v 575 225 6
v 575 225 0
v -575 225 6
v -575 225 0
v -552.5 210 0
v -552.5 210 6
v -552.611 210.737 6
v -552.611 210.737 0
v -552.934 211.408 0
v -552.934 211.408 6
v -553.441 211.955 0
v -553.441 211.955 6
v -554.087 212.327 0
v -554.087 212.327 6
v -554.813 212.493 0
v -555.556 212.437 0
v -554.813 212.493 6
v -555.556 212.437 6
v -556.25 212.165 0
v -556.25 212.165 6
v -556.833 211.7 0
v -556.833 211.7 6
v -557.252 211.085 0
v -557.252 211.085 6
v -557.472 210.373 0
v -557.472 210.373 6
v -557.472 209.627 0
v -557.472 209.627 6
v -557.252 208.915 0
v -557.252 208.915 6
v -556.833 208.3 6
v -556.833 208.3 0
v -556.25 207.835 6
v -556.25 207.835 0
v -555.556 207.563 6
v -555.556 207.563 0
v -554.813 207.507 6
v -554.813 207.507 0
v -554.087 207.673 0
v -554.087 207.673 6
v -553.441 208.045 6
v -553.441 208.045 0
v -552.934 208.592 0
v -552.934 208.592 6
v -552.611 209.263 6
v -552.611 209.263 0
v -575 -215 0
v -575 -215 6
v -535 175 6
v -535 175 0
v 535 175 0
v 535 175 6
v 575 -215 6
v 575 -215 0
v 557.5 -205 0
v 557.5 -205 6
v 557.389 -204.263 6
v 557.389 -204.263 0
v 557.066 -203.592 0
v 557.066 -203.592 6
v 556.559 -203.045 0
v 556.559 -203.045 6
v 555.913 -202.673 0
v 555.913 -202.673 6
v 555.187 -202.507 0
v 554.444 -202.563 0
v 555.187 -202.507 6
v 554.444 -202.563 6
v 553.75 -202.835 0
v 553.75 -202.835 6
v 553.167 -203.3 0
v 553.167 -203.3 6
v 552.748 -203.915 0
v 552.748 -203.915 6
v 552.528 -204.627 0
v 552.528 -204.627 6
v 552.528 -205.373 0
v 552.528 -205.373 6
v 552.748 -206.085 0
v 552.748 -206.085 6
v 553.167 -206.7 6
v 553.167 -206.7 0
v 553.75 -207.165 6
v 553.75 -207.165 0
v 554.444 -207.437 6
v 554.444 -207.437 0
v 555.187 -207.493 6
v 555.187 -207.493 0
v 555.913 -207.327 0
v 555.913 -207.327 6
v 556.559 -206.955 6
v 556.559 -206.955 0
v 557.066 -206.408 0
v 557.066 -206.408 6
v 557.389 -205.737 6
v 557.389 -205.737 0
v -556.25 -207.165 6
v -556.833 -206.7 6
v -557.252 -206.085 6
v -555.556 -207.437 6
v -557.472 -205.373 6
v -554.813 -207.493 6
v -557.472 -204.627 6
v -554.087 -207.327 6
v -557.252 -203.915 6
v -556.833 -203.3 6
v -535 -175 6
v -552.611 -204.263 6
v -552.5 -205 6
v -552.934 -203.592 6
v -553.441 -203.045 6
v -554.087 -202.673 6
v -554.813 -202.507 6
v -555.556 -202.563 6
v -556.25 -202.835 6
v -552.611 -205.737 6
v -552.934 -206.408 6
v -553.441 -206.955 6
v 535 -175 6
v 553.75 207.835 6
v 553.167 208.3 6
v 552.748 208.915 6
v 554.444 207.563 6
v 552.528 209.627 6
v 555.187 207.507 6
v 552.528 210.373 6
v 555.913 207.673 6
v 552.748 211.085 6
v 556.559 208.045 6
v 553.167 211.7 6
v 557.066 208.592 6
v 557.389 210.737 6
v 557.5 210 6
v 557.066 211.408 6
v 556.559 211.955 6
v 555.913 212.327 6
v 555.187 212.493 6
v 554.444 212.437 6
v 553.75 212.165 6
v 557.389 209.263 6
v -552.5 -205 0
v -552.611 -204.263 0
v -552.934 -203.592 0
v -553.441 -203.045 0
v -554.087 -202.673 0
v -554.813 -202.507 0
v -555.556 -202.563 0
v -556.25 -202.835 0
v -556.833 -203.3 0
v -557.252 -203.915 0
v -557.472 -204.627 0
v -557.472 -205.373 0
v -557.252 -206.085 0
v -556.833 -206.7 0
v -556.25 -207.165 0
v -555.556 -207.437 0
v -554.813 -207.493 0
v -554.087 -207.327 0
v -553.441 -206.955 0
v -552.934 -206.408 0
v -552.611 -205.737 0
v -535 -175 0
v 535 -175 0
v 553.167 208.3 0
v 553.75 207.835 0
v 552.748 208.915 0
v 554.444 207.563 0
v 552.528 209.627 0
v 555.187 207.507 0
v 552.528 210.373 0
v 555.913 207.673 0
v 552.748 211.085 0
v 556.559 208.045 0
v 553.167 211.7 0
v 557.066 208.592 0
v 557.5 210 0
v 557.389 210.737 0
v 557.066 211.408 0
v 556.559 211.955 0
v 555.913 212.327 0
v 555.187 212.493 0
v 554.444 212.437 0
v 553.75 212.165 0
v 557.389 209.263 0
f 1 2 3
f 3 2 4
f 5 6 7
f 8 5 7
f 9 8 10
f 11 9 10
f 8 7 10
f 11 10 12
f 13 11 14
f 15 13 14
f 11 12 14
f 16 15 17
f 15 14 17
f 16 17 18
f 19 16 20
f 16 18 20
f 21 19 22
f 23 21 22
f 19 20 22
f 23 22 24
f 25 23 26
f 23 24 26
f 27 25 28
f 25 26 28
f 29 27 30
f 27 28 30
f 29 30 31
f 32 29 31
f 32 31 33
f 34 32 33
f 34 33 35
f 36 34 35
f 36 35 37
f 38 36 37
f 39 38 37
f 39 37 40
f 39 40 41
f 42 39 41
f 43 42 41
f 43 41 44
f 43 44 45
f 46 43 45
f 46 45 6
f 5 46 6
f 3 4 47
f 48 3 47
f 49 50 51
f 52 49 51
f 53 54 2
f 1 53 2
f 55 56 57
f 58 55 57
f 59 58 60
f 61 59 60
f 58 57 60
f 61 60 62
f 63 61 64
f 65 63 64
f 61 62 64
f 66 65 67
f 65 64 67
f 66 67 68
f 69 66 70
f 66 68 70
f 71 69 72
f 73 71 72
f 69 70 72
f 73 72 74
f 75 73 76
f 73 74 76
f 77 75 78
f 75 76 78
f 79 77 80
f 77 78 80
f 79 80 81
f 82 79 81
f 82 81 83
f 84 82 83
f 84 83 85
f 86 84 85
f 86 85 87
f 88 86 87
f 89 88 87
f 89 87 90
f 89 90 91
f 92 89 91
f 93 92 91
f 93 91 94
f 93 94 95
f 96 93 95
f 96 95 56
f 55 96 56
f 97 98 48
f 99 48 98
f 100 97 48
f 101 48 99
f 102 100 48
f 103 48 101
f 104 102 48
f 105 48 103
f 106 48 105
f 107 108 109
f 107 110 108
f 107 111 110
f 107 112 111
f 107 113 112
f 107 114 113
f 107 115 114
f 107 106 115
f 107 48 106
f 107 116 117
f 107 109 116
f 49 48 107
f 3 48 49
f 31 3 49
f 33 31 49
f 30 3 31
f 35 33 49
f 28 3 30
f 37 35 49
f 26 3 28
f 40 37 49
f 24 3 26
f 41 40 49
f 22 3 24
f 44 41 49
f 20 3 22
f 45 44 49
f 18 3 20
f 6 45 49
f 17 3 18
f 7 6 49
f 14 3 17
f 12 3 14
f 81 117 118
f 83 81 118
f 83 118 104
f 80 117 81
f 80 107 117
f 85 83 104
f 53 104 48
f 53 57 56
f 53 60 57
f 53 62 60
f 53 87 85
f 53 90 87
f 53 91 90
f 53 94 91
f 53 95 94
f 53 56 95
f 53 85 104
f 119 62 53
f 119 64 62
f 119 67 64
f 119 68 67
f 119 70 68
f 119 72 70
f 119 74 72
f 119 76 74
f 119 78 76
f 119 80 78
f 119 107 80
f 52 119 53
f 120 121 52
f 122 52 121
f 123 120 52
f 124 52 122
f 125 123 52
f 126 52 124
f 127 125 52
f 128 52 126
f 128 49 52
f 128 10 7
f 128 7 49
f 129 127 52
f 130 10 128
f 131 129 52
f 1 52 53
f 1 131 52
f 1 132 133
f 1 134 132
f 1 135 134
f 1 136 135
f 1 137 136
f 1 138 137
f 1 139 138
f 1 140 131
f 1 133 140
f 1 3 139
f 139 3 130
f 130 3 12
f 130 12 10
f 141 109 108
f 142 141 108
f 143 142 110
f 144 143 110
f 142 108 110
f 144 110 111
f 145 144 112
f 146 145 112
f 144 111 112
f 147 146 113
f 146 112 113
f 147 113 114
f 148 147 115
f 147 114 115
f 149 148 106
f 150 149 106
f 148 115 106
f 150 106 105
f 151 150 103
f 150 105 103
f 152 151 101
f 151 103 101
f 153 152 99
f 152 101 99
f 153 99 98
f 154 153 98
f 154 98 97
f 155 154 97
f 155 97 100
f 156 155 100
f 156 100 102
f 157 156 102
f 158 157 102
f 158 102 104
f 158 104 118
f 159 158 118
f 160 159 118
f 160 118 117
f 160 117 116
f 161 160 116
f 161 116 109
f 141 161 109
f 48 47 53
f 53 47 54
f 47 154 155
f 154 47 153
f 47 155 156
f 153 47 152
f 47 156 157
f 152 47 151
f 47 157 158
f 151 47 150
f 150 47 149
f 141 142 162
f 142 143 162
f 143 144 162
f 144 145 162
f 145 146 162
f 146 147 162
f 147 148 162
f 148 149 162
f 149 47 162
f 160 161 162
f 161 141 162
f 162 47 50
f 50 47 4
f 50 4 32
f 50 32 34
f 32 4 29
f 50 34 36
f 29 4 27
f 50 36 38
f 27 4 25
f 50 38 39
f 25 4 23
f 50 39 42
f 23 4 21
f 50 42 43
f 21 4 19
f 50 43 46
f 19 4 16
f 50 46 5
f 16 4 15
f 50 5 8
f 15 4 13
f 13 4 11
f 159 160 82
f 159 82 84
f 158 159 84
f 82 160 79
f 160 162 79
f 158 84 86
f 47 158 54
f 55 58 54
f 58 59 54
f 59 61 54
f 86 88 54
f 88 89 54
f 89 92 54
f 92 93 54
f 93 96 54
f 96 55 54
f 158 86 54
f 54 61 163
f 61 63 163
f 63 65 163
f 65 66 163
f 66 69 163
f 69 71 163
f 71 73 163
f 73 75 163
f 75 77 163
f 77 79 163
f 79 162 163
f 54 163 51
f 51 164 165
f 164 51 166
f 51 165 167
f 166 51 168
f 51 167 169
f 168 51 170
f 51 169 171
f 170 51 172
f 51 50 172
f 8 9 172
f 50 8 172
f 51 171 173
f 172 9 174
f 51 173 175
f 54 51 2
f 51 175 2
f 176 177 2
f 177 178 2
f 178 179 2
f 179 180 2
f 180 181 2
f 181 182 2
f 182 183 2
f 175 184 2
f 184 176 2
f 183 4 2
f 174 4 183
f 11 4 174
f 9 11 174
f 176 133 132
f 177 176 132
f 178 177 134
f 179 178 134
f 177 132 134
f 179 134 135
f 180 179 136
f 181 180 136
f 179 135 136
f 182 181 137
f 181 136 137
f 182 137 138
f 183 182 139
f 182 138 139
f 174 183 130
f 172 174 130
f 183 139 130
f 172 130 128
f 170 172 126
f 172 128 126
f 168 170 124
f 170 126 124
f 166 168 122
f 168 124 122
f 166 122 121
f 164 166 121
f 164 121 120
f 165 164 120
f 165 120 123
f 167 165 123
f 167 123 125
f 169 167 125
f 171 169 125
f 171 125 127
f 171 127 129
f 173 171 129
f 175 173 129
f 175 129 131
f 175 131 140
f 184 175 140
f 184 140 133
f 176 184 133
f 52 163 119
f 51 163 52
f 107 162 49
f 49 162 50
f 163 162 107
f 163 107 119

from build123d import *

# Parameters (mm, degrees)
SKETCH1_W           = 1070
SKETCH1_H           = 350
BOSS_EXTRUDE1_DEPTH = 6
SKETCH2_R           = 2.5
CUT_EXTRUDE1_DEPTH  = 618.483603021


with BuildPart() as part:
    # Sketch1 → Boss-Extrude1 (new body)
    with BuildSketch(Plane.XY):
        Polygon((575, -215), (575, 175), (575, 225), (535, 225), (-535, 225), (-575, 225), (-575, 175), (-575, -215), align=None)
        Rectangle(SKETCH1_W, SKETCH1_H, mode=Mode.SUBTRACT)
    extrude(amount=BOSS_EXTRUDE1_DEPTH)

    # Sketch2 → Cut-Extrude1 (cut, through all)
    with BuildSketch(Plane.XY.offset(6)):
        with Locations((-555, 210)):
            Circle(SKETCH2_R)
        with Locations((-555, -205)):
            Circle(SKETCH2_R)
        with Locations((555, -205)):
            Circle(SKETCH2_R)
        with Locations((555, 210)):
            Circle(SKETCH2_R)
    extrude(amount=-CUT_EXTRUDE1_DEPTH, mode=Mode.SUBTRACT)


solid = part.part
